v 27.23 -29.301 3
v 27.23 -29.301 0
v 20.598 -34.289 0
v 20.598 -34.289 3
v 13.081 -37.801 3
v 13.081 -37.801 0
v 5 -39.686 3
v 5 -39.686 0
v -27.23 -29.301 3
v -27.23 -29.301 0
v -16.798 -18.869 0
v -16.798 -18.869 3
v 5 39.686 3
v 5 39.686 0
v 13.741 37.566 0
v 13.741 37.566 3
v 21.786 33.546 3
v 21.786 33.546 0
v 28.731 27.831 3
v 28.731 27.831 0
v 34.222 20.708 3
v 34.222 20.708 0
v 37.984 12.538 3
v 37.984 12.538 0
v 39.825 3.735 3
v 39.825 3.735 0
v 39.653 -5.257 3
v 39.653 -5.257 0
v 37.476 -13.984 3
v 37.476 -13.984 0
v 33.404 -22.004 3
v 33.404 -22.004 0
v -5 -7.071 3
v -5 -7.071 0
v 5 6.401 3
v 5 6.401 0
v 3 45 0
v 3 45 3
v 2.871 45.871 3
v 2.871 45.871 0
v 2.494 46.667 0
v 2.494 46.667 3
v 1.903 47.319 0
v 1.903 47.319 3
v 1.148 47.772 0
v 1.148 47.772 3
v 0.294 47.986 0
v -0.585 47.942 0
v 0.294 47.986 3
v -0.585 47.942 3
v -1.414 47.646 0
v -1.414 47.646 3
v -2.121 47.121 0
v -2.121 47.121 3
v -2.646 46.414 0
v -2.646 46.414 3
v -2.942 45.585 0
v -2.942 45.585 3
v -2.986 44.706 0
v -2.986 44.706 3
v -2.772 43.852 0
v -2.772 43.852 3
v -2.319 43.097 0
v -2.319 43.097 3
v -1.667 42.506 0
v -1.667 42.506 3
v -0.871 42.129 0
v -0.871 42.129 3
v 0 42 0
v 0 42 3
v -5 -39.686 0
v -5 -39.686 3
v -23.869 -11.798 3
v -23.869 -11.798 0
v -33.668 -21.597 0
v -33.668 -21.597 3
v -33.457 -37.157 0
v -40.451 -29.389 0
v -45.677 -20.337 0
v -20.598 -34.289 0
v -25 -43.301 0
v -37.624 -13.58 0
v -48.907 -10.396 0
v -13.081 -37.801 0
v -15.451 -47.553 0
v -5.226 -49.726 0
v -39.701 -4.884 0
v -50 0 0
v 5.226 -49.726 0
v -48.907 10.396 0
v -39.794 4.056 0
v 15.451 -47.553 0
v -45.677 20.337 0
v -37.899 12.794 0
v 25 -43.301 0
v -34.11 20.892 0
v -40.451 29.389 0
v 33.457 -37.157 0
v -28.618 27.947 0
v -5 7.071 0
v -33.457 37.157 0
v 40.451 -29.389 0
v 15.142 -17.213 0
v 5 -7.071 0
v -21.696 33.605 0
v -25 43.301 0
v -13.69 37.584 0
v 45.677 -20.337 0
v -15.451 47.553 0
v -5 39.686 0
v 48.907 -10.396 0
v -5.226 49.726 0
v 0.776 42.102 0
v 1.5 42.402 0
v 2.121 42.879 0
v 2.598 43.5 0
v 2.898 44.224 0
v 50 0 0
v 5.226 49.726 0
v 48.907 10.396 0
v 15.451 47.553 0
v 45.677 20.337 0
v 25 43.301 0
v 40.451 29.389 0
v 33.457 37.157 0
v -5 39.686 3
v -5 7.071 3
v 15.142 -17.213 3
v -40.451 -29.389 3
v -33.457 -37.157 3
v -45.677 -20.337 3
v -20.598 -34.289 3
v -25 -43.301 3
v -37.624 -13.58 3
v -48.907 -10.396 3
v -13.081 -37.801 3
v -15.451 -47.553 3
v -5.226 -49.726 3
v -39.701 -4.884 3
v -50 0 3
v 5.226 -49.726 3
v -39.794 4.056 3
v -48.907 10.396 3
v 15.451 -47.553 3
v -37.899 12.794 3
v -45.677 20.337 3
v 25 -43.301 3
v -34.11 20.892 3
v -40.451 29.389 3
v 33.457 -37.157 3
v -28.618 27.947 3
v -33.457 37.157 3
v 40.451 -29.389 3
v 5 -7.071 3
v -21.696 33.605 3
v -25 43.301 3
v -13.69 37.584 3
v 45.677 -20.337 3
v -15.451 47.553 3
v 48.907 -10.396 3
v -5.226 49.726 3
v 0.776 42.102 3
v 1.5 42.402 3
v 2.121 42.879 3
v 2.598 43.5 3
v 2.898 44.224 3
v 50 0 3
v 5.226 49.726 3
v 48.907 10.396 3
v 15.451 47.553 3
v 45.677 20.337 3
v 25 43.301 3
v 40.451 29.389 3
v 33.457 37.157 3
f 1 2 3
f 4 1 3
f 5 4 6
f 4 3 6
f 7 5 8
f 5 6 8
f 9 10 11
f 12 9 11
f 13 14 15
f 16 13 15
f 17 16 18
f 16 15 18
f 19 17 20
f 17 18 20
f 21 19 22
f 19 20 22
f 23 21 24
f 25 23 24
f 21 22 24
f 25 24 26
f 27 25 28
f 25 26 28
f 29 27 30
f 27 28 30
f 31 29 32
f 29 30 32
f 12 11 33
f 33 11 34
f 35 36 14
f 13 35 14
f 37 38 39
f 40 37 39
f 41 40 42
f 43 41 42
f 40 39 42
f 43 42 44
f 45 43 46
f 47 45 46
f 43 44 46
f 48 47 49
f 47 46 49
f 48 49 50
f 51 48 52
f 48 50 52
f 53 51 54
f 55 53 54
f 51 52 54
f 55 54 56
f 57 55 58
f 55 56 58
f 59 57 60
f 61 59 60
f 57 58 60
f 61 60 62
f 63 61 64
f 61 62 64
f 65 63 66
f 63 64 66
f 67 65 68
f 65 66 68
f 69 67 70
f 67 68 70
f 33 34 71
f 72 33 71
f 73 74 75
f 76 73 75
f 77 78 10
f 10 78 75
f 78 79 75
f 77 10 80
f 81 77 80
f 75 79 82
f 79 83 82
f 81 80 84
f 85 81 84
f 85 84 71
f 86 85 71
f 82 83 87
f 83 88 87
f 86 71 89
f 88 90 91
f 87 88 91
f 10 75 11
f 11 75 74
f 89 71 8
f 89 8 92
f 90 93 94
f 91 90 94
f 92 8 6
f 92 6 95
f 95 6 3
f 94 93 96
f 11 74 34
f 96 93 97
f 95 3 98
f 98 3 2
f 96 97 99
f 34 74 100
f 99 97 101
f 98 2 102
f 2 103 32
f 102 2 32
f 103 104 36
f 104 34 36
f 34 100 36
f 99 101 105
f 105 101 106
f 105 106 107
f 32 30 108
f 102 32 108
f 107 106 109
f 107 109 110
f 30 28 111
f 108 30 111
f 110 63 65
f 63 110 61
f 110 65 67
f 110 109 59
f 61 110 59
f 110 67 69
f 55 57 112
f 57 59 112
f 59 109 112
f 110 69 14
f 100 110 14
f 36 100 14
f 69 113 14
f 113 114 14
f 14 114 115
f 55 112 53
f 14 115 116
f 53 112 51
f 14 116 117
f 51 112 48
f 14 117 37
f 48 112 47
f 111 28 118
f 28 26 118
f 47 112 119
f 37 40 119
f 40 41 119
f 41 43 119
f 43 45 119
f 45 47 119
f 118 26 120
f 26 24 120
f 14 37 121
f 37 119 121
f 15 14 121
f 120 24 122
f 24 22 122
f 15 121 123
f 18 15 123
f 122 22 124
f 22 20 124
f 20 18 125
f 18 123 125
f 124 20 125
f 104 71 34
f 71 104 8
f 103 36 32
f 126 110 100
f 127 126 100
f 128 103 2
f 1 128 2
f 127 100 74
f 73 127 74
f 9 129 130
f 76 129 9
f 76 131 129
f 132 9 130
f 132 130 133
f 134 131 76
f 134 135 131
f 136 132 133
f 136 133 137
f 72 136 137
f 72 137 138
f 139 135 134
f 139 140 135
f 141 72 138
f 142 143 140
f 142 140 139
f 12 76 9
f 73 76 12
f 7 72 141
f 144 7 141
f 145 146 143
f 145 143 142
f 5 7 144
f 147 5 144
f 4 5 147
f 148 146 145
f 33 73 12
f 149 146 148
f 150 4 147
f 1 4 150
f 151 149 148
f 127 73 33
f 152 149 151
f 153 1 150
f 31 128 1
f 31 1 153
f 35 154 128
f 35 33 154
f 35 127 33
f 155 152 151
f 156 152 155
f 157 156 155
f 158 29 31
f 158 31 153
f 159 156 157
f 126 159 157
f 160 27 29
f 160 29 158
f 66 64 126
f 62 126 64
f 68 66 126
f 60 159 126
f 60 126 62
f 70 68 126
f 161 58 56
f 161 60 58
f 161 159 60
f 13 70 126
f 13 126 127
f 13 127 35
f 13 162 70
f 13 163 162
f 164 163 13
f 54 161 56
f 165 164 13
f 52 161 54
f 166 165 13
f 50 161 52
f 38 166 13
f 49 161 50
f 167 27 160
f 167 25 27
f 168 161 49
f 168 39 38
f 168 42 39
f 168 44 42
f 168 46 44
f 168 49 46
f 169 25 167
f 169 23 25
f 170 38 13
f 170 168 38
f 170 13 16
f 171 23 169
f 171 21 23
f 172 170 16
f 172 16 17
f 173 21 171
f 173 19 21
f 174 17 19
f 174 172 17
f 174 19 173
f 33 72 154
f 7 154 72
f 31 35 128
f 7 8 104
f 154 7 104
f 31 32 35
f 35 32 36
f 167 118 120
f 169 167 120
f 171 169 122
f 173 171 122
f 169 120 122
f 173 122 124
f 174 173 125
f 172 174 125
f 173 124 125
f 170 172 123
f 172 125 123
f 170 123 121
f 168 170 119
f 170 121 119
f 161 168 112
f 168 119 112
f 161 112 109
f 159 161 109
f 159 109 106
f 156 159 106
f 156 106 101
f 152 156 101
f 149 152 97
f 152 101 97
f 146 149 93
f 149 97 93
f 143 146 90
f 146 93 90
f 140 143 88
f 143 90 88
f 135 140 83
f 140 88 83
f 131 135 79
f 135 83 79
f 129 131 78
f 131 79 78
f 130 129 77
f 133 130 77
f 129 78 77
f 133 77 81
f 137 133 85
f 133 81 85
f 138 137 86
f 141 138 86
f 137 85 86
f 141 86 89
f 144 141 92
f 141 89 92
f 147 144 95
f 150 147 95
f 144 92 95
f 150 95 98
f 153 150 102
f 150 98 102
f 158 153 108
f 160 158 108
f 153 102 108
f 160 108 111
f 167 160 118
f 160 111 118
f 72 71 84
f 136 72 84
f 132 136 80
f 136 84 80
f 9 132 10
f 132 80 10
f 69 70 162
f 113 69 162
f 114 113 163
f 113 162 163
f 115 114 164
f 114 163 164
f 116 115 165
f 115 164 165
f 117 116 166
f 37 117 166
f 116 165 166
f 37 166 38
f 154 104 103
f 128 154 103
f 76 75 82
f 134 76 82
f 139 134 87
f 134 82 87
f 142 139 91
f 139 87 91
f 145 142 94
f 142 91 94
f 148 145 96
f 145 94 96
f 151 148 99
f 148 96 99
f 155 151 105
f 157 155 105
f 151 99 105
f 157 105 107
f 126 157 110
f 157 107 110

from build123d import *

# Parameters (mm, degrees)
F0_R     = 50
F1_DEPTH = 3
F2_DEPTH = 3
F4_DEPTH = 25


with BuildPart() as f1:
    # F0 (on Top) → F1 (new body)
    with BuildSketch(Plane.XY):
        Circle(F0_R)
        with BuildLine():
            Line((-16.798327, -18.869394), (-5, -7.071068))
            Line((-5, -7.071068), (-5, -39.68627))
            ThreePointArc((-5, -39.68627), (-16.930856, -36.240118), (-27.229775, -29.300842))
            Line((-27.229775, -29.300842), (-16.798327, -18.869394))
        make_face(mode=Mode.SUBTRACT)
        with BuildLine():
            Line((5, -39.68627), (5, -7.071068))
            Line((5, -7.071068), (15.141531, -17.212599))
            Line((15.141531, -17.212599), (27.229775, -29.300842))
            ThreePointArc((27.229775, -29.300842), (16.930856, -36.240118), (5, -39.68627))
        make_face(mode=Mode.SUBTRACT)
        with BuildLine():
            ThreePointArc((-33.668346, -21.597279), (-36.231596, 16.949083), (-5, 39.68627))
            Line((-5, 39.68627), (-5, 7.071068))
            Line((-5, 7.071068), (-23.869394, -11.798327))
            Line((-23.869394, -11.798327), (-33.668346, -21.597279))
        make_face(mode=Mode.SUBTRACT)
        with BuildLine():
            Line((11.400651, 0), (5, 6.400651))
            Line((5, 6.400651), (5, 39.68627))
            ThreePointArc((5, 39.68627), (36.333601, 16.729299), (33.404229, -22.003578))
            Line((33.404229, -22.003578), (21.87739, -10.476739))
            Line((21.87739, -10.476739), (11.400651, 0))
        make_face(mode=Mode.SUBTRACT)
    extrude(amount=F1_DEPTH)

    # F0 (on Top) → F2 (join)
    with BuildSketch(Plane.XY):
        Circle(F0_R)
        with BuildLine():
            Line((-16.798327, -18.869394), (-5, -7.071068))
            Line((-5, -7.071068), (-5, -39.68627))
            ThreePointArc((-5, -39.68627), (-16.930856, -36.240118), (-27.229775, -29.300842))
            Line((-27.229775, -29.300842), (-16.798327, -18.869394))
        make_face(mode=Mode.SUBTRACT)
        with BuildLine():
            Line((5, -39.68627), (5, -7.071068))
            Line((5, -7.071068), (15.141531, -17.212599))
            Line((15.141531, -17.212599), (27.229775, -29.300842))
            ThreePointArc((27.229775, -29.300842), (16.930856, -36.240118), (5, -39.68627))
        make_face(mode=Mode.SUBTRACT)
        with BuildLine():
            ThreePointArc((-33.668346, -21.597279), (-36.231596, 16.949083), (-5, 39.68627))
            Line((-5, 39.68627), (-5, 7.071068))
            Line((-5, 7.071068), (-23.869394, -11.798327))
            Line((-23.869394, -11.798327), (-33.668346, -21.597279))
        make_face(mode=Mode.SUBTRACT)
        with BuildLine():
            Line((11.400651, 0), (5, 6.400651))
            Line((5, 6.400651), (5, 39.68627))
            ThreePointArc((5, 39.68627), (36.333601, 16.729299), (33.404229, -22.003578))
            Line((33.404229, -22.003578), (21.87739, -10.476739))
            Line((21.87739, -10.476739), (11.400651, 0))
        make_face(mode=Mode.SUBTRACT)
    extrude(amount=F2_DEPTH)

    # F3 (on face) → F4 (cut)
    with BuildSketch(Plane.XY.offset(3)):
        with BuildLine():
            ThreePointArc((0, 42), (2.12132, 42.87868), (3, 45))
            ThreePointArc((3, 45), (-2.12132, 47.12132), (0, 42))
        make_face()
    extrude(amount=-F4_DEPTH, mode=Mode.SUBTRACT)


solid = f1.part
